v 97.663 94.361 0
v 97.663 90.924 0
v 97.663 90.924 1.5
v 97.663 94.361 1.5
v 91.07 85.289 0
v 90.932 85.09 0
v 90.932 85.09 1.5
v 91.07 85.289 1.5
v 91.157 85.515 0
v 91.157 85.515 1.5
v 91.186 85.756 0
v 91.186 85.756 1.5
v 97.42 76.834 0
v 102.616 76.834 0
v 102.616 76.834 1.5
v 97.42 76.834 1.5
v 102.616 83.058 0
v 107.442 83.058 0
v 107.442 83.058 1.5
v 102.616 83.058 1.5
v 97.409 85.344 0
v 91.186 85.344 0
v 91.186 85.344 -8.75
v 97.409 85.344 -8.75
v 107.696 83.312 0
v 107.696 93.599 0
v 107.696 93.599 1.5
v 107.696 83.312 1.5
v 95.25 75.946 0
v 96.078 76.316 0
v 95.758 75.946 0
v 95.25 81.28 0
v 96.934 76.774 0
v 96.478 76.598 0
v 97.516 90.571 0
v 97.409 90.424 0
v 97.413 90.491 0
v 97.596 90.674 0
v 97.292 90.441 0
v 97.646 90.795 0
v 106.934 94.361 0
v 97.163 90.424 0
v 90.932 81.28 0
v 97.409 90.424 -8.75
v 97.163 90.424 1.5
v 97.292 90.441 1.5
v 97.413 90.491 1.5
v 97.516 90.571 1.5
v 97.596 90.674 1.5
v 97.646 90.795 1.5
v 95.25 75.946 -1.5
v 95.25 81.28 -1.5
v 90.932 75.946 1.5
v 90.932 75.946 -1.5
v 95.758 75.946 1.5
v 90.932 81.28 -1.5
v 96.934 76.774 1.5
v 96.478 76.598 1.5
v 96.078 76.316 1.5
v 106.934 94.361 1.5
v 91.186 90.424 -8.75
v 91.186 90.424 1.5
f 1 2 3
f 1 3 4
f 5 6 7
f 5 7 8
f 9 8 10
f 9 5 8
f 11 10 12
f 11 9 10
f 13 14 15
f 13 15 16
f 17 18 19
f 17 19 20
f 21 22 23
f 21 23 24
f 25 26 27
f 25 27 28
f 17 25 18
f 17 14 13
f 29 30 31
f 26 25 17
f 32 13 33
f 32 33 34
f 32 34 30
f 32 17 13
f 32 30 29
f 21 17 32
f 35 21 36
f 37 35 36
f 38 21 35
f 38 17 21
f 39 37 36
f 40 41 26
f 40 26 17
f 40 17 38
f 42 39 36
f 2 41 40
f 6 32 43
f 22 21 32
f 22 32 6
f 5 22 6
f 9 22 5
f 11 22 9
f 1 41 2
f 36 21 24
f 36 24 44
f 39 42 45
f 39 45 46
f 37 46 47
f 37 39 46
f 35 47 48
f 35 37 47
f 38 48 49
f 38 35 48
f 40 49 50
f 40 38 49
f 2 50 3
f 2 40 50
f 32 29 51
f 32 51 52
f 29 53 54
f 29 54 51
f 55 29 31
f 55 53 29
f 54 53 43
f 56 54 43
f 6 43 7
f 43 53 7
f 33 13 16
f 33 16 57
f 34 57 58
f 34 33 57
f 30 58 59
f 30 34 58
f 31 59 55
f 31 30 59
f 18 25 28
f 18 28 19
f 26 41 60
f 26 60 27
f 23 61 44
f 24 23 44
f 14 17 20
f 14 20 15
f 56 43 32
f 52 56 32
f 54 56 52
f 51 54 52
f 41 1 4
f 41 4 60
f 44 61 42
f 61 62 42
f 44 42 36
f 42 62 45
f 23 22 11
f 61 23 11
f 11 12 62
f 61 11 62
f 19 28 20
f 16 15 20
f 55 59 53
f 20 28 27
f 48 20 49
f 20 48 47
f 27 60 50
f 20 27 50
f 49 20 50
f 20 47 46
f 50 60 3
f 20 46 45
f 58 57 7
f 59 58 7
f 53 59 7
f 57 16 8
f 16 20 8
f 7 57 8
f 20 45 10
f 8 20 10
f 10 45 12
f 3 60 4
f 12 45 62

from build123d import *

# Parameters (mm, degrees)
EXTRUDE_1_DEPTH = 1.5
SKETCH_2_W      = 4.318
SKETCH_2_H      = 5.334
EXTRUDE_2_DEPTH = 1.5
SKETCH_3_W      = 6.223
SKETCH_3_H      = 5.08
EXTRUDE_3_DEPTH = 8.75
FILLET_1_R      = 1
FILLET_2_R      = 2


with BuildPart() as part:
    # 草图1 → 凸台-拉伸1 (new body)
    with BuildSketch(Plane.XY):
        with BuildLine():
            Line((90.932, 85.09), (91.186, 85.344))
            Line((91.186, 85.344), (91.186, 90.424))
            Line((91.186, 90.424), (97.162789, 90.424))
            ThreePointArc((97.162789, 90.424), (97.51649159, 90.57050841), (97.663, 90.924211))
            Line((97.663, 90.924211), (97.663, 94.361))
            Line((97.663, 94.361), (106.934, 94.361))
            Line((106.934, 94.361), (107.696, 93.599))
            Line((107.696, 93.599), (107.696, 83.312))
            Line((107.696, 83.312), (107.442, 83.058))
            Line((107.442, 83.058), (102.616, 83.058))
            Line((102.616, 83.058), (102.616, 76.833545254))
            Line((102.616, 76.833545254), (95.758, 76.833545254))
            Line((95.758, 76.833545254), (95.758, 75.946))
            Line((95.758, 75.946), (90.932, 75.946))
            Line((90.932, 75.946), (90.932, 85.09))
        make_face()
    extrude(amount=EXTRUDE_1_DEPTH)

    # 草图2 → 凸台-拉伸2 (add)
    with BuildSketch(Plane.XY):
        with Locations((93.091, 78.613)):
            Rectangle(SKETCH_2_W, SKETCH_2_H)
    extrude(amount=-EXTRUDE_2_DEPTH)

    # 草图3 → 凸台-拉伸3 (add)
    with BuildSketch(Plane.XY):
        with Locations((94.2975, 87.884)):
            Rectangle(SKETCH_3_W, SKETCH_3_H)
    extrude(amount=-EXTRUDE_3_DEPTH)

    # 圆角1
    # the kernel refuses this fillet: 1 mm, written as the material it adds along each edge
    with BuildSketch(Plane(origin=(91.186, 85.344, 0), x_dir=(-0.7071067811889411, -0.7071067811841542, 0), z_dir=(0, 0, 1))) as fillet_1_piece_1:
        with BuildLine():
            CenterArc((0.415817011, -0.998396551), FILLET_1_R, 93.245063402, 41.754936598)
            Line((-0.29128977, -0.29128977), (0, 0))
            Line((0, 0), (0.359210245, 0))
        make_face()
    extrude(amount=1.5)

    # 圆角2
    # the kernel refuses this fillet: 2 mm, written as the material it adds along each edge
    with BuildSketch(Plane(origin=(95.758, 76.833545254, 0), x_dir=(1, 0, 0), z_dir=(0, 0, 1))) as fillet_2_piece_1:
        with BuildLine():
            CenterArc((1.662060299, -2), FILLET_2_R, 90, 56.204705158)
            Line((0, -0.887545254), (-0.033241206, -0.86529616))
            ThreePointArc((-0.033241206, -0.86529616), (-0.04, -0.443772627), (-0.04, 0))
            Line((-0.04, 0), (0, 0.04))
            Line((0, 0.04), (1.662060299, 0.04))
            Line((1.662060299, 0.04), (1.662060299, 0))
        make_face()
    extrude(amount=1.5)


solid = part.part
